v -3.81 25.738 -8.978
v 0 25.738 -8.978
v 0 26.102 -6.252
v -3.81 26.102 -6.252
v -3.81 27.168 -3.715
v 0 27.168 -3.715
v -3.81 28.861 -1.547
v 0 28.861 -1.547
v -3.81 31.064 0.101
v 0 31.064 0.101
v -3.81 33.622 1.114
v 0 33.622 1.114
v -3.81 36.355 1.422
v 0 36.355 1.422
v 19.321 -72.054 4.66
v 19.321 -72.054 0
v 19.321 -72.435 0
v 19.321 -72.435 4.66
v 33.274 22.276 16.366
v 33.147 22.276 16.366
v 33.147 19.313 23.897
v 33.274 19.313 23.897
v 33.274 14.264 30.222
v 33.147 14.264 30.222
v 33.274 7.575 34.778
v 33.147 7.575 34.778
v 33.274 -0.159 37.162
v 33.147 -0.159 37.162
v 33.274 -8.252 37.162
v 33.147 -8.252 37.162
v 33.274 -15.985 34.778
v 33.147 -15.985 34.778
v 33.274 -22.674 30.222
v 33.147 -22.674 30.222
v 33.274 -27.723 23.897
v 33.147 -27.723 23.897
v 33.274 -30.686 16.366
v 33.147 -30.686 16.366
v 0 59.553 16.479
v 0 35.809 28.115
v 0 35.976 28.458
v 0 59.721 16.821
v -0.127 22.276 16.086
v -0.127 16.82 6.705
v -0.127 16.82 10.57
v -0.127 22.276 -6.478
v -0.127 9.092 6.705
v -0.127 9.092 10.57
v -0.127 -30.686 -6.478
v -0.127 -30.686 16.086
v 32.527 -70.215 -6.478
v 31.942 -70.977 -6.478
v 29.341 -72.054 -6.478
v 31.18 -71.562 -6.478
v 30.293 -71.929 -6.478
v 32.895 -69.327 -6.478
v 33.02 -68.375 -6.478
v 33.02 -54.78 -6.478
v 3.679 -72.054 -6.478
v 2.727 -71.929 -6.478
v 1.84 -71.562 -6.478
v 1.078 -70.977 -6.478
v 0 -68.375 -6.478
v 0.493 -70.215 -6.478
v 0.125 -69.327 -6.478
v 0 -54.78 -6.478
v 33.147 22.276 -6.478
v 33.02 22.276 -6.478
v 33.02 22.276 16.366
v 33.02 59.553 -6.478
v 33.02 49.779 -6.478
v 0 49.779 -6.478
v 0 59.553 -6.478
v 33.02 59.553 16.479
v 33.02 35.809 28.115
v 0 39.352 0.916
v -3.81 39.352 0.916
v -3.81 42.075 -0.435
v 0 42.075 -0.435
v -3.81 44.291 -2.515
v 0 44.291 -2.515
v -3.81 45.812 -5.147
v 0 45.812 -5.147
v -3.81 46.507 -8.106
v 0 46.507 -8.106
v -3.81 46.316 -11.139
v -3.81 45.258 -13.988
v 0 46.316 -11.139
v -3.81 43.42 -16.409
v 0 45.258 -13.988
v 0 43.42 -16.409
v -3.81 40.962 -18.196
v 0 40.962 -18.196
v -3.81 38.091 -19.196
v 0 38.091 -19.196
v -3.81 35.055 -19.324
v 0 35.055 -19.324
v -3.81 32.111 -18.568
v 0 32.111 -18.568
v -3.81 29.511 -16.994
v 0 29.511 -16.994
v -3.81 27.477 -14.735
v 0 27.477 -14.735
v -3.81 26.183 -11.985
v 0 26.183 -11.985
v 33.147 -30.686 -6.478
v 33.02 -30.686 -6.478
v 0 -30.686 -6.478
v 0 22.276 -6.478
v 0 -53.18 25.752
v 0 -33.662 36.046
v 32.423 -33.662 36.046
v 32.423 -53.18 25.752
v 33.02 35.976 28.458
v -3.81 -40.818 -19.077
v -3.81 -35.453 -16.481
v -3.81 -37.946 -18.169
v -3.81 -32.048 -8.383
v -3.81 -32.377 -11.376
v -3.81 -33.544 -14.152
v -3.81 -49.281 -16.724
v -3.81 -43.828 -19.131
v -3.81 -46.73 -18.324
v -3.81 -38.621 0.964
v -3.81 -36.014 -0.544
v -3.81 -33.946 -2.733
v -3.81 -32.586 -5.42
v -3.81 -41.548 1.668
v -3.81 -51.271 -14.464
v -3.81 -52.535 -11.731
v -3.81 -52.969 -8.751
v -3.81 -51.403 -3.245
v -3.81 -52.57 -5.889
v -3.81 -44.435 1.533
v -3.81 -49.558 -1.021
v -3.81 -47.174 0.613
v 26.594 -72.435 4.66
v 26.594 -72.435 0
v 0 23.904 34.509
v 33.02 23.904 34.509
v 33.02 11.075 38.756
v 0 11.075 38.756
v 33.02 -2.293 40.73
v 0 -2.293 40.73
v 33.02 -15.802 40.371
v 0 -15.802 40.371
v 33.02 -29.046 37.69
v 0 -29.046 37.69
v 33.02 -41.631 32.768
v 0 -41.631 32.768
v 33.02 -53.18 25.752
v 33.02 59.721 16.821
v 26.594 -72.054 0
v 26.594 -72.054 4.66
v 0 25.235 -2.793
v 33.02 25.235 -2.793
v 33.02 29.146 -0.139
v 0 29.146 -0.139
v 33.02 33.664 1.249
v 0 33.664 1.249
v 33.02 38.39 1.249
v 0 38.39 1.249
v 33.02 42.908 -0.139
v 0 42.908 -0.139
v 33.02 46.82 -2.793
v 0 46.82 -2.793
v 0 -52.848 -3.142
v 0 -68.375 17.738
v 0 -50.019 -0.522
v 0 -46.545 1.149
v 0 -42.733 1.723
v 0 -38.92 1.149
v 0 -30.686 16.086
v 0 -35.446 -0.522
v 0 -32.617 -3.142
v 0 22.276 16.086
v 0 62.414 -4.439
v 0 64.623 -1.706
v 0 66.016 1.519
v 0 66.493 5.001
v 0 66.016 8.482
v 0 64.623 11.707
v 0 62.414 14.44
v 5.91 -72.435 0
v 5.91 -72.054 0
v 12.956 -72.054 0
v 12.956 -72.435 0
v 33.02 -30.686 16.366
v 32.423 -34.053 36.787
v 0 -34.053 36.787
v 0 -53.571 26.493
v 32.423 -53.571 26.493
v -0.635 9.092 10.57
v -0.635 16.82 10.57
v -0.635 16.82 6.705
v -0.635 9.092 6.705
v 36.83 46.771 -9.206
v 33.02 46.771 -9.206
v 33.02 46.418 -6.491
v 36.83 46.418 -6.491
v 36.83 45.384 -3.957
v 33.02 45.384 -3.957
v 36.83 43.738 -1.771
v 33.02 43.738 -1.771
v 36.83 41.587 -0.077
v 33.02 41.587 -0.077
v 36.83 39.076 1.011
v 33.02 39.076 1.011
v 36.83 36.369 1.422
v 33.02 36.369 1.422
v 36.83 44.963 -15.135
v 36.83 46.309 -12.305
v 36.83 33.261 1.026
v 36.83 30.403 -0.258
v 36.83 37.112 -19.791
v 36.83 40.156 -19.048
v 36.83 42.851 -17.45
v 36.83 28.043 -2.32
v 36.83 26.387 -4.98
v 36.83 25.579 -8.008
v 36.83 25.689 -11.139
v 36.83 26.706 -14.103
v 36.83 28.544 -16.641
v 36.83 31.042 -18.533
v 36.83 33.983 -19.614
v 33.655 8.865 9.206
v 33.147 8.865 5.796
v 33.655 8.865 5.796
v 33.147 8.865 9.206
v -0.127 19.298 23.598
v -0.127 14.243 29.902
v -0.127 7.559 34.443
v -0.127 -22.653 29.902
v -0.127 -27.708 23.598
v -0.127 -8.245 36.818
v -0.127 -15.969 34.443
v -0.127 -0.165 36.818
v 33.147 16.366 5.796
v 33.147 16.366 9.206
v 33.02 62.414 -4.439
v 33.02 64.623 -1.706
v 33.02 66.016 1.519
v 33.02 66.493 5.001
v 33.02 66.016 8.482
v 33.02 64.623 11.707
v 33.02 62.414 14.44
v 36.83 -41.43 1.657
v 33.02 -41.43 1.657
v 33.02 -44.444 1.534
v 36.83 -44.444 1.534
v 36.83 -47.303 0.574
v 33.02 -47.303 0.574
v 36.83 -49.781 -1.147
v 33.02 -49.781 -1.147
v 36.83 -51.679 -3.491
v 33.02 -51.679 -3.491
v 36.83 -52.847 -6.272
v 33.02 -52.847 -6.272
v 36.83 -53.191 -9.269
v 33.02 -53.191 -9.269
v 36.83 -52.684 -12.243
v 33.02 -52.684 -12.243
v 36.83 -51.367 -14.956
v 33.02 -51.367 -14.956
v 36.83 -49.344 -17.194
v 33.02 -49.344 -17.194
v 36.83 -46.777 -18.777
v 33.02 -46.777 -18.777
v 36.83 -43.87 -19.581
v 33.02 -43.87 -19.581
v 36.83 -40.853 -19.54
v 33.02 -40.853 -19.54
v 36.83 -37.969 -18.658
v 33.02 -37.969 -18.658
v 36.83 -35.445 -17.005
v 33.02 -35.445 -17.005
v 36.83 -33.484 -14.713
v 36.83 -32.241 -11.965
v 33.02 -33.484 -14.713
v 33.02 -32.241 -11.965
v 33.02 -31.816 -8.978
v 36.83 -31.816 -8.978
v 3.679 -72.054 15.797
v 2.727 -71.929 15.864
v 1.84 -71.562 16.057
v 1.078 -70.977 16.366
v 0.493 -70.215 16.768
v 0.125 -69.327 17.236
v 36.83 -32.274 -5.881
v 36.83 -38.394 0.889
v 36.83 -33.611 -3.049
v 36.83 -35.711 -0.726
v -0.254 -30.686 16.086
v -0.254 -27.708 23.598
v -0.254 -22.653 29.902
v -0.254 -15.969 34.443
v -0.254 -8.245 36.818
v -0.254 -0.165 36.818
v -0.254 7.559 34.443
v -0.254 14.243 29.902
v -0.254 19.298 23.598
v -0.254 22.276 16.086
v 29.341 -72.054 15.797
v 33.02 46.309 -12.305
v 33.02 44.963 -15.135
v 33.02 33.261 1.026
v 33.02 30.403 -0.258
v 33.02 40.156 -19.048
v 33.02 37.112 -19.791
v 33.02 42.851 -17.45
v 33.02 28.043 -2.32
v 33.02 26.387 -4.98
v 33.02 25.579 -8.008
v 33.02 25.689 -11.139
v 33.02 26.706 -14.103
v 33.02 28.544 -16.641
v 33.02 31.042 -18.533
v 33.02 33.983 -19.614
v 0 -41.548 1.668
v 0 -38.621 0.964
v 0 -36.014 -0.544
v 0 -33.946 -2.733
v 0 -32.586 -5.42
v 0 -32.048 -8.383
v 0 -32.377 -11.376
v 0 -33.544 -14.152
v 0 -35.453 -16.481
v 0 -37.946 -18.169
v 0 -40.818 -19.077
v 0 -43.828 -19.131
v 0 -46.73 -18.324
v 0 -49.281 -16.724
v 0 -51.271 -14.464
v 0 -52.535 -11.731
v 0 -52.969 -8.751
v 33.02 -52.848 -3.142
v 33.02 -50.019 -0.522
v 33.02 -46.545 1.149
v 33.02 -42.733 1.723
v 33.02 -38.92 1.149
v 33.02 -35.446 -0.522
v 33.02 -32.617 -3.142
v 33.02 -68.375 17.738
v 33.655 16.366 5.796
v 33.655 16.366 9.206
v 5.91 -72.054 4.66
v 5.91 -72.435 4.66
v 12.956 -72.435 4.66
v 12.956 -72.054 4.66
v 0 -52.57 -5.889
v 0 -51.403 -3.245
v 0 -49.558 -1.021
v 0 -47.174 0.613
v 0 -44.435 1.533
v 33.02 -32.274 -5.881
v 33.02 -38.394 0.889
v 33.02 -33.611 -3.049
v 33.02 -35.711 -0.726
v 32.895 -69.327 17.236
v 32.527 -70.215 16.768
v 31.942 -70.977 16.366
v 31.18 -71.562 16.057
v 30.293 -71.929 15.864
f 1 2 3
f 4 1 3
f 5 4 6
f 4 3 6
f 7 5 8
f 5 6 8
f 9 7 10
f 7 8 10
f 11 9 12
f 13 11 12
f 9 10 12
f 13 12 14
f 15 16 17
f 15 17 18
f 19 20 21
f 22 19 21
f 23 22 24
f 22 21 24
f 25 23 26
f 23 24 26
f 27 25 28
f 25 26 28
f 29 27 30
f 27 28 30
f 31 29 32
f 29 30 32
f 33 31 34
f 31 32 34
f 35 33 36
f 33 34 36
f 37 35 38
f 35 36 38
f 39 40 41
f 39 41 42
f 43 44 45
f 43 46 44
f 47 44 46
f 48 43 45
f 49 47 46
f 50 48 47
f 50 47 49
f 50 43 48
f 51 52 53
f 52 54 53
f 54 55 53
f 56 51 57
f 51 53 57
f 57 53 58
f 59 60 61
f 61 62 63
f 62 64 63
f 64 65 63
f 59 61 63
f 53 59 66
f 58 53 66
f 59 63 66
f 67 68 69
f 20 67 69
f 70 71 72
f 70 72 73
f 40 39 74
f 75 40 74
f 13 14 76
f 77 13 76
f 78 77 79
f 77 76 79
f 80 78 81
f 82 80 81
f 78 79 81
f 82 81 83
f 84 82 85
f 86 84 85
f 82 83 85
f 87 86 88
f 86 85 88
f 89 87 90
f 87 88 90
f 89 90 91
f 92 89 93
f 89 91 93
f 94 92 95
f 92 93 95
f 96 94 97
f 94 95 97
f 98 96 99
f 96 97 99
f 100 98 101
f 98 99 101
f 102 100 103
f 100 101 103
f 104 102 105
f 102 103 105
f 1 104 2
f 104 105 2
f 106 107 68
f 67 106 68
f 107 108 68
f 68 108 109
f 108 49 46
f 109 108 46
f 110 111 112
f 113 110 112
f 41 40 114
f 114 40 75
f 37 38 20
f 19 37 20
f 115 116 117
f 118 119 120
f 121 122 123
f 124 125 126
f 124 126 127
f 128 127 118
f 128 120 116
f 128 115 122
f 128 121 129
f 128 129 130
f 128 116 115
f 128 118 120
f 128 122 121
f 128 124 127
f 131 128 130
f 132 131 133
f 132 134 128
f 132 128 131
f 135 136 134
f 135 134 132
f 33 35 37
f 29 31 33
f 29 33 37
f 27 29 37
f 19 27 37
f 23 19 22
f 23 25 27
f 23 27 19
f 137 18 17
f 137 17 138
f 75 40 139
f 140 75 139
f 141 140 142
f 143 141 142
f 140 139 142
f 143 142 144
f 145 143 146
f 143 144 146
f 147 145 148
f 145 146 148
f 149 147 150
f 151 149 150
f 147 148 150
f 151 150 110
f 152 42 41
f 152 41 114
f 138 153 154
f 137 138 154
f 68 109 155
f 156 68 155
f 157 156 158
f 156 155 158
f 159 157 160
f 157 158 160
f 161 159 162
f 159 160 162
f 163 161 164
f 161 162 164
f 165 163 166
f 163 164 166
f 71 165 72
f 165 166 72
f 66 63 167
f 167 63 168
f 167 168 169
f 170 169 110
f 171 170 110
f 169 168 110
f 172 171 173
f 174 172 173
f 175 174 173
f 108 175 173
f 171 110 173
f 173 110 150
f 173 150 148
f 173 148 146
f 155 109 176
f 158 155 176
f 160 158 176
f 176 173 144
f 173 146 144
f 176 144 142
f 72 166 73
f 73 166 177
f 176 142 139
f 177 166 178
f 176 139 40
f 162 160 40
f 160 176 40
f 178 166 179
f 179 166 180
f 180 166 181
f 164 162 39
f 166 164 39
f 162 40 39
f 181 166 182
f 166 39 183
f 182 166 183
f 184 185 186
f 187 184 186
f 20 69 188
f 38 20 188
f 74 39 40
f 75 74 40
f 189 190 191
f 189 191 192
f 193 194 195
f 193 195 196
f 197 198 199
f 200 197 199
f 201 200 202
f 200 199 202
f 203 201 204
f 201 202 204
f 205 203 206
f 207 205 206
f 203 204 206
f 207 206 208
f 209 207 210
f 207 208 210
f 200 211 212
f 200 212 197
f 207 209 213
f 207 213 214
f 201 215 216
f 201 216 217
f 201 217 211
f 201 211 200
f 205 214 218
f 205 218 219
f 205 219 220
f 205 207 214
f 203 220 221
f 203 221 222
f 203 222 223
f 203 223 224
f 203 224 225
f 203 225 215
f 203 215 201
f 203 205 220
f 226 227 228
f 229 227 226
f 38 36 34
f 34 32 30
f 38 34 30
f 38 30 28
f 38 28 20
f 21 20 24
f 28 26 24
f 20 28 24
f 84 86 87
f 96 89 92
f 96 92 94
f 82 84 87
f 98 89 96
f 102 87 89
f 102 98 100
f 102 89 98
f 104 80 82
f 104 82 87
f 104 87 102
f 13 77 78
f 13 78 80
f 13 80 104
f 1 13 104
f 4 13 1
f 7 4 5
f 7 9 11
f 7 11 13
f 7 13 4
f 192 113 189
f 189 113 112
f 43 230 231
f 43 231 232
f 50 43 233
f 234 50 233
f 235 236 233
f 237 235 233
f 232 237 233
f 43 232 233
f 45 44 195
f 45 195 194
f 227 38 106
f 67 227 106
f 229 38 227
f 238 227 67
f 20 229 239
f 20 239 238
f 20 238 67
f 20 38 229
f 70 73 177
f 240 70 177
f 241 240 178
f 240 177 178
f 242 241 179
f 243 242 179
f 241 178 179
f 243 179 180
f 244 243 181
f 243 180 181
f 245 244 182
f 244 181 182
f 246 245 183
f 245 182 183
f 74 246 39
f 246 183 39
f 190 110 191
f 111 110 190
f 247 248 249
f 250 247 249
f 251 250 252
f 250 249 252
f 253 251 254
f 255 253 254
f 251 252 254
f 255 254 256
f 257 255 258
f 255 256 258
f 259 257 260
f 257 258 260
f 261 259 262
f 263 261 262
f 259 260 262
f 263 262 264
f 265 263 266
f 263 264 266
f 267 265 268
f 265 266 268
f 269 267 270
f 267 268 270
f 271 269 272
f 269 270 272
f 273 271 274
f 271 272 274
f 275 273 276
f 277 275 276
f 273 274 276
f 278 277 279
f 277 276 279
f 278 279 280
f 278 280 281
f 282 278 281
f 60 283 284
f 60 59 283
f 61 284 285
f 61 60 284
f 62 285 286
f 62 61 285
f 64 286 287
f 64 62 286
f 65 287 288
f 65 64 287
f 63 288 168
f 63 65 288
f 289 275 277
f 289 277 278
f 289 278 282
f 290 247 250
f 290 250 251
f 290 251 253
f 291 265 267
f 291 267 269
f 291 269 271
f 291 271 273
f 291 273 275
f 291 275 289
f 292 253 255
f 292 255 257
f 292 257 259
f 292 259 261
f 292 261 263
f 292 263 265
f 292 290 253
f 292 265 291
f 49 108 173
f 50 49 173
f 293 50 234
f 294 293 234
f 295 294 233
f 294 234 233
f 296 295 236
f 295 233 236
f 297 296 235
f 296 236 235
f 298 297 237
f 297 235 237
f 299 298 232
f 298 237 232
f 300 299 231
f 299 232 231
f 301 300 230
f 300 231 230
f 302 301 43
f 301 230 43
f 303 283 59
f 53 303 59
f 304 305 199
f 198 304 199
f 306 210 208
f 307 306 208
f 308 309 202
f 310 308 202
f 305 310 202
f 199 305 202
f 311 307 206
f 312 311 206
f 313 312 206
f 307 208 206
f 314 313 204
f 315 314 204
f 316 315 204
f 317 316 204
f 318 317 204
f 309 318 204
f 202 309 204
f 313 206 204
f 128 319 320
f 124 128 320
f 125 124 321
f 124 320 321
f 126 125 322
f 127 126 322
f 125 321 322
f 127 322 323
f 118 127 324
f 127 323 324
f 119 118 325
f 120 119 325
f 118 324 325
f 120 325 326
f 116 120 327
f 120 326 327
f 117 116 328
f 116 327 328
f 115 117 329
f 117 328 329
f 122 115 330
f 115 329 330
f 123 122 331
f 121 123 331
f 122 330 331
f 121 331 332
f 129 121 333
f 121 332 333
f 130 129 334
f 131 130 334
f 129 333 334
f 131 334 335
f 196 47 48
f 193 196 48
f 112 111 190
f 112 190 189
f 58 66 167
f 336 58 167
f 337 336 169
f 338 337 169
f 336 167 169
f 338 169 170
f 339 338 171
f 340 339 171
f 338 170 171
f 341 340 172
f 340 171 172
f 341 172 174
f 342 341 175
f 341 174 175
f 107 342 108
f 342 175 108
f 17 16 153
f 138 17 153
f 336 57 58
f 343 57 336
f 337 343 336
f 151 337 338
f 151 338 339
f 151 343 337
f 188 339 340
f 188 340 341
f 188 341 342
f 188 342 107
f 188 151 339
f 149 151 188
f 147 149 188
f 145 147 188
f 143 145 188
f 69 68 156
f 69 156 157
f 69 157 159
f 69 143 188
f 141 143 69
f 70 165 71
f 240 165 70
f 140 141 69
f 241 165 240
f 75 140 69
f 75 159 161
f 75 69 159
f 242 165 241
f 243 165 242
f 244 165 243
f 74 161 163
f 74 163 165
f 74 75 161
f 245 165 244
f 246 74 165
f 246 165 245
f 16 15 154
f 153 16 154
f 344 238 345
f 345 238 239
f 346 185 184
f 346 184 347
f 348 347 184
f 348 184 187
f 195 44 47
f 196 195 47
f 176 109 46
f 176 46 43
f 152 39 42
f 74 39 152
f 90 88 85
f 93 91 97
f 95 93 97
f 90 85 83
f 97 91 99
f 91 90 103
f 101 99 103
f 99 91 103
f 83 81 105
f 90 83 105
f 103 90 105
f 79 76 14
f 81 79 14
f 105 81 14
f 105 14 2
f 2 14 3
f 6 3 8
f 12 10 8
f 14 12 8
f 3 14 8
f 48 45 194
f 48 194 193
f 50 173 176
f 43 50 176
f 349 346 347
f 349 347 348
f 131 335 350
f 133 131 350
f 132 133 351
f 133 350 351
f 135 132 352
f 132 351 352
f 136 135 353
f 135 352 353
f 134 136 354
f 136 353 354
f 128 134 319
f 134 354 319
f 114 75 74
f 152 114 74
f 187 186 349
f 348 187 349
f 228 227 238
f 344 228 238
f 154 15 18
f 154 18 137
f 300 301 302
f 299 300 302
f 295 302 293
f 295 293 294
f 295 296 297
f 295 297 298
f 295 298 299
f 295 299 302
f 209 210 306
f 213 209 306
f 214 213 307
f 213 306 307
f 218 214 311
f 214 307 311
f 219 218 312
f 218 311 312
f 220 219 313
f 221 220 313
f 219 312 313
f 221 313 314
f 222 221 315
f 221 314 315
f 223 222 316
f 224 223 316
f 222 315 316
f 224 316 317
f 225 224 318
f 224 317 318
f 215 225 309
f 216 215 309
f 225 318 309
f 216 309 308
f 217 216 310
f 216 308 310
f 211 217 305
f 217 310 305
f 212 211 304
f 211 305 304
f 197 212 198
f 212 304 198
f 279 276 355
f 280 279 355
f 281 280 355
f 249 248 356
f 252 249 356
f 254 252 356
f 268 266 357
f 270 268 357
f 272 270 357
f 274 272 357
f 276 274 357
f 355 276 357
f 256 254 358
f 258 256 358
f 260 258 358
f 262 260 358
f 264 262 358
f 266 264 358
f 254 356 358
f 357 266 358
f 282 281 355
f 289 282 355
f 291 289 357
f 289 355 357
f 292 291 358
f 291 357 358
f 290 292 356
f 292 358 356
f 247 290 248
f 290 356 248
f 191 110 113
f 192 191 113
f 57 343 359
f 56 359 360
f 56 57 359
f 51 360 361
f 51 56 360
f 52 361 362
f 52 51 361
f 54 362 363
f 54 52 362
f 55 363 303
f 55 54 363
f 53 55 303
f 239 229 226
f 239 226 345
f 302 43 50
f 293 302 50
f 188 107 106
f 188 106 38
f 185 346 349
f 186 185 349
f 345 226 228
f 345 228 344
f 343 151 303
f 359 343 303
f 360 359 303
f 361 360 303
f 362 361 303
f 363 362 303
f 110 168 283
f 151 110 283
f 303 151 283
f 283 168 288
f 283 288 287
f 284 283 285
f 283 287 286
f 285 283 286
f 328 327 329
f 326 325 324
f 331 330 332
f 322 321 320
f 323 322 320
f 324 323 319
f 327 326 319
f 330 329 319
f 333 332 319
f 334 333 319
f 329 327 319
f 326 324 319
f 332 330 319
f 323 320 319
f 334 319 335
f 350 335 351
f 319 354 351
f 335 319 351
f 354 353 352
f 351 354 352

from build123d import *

# Parameters (mm, degrees)
F1_DEPTH  = 33.02
F4_DEPTH  = 3.81
F6_DEPTH  = 3.81
F7_DEPTH  = 3.81
F8_DEPTH  = 3.81
F9_W      = 27.328588767
F9_H      = 22.564008832
F9_W_2    = 25.6325763185
F10_DEPTH = 0.127
F12_DEPTH = 0.127
F13_W     = 25.650058873
F13_H     = 22.8437650949
F13_W_2   = 27.3111062124
F14_DEPTH = 0.127
F16_DEPTH = 0.127
F17_R     = 3.6792614691
F18_W     = 7.7282376587
F18_H     = 3.8641188294
F19_DEPTH = 0.508
F20_W     = 7.5009372085
F20_H     = 3.4095174633
F21_DEPTH = 0.508
F22_W     = 33.02
F22_H     = 26.4421320528
F23_DEPTH = 0.381
F24_W     = 7.0463349111
F24_H     = 4.6596731991
F25_DEPTH = 0.381
F24_W_2   = 7.2736367583
F26_W     = 32.4227958918
F26_H     = 22.0667268427
F27_DEPTH = 0.8382


with BuildPart() as f1:
    # F0 (on Right) → F1 (new body)
    with BuildSketch(Plane.YZ):
        with BuildLine():
            Line((-72.0544606447, 15.7974287868), (-72.0544606447, -6.4780823886))
            Line((-72.0544606447, -6.4780823886), (-54.779574275, -6.4780823886))
            ThreePointArc((-54.779574275, -6.4780823886), (-42.7326140925, 1.7227260465), (-30.68565391, -6.4780823886))
            Line((-30.68565391, -6.4780823886), (22.2755111754, -6.4780823886))
            ThreePointArc((22.2755111754, -6.4780823886), (36.0272303224, 1.4251967706), (49.7789494693, -6.4780823886))
            Line((49.7789494693, -6.4780823886), (59.5528967679, -6.4780823886))
            ThreePointArc((59.5528967679, -6.4780823886), (66.4925608321, 5.0006248057), (59.5528967679, 16.479332))
            Line((59.5528967679, 16.479332), (35.8086712658, 28.1154010445))
            ThreePointArc((35.8086712658, 28.1154010445), (-9.055266807, 40.8429036735), (-53.1802996993, 25.7517229766))
            Line((-53.1802996993, 25.7517229766), (-72.0544606447, 15.7974287868))
        make_face()
    extrude(amount=F1_DEPTH)

    # F9 (on face) → F10 (join)
    with BuildSketch(Plane(origin=(0, 0, 0), x_dir=(0, -1, 0), z_dir=(-1, 0, 0))):
        with Locations((17.0213595266, 4.8039220273)):
            Rectangle(F9_W, F9_H)
        with Locations((-9.4592230162, 4.8039220273)):
            Rectangle(F9_W_2, F9_H)
    extrude(amount=F10_DEPTH)

    # F13 (on face) → F14 (join)
    with BuildSketch(Plane.YZ.offset(33.02)):
        with Locations((-17.8606244735, 4.9438001588)):
            Rectangle(F13_W, F13_H)
        with Locations((8.6199580692, 4.9438001588)):
            Rectangle(F13_W_2, F13_H)
    extrude(amount=F14_DEPTH)

    # F17
    f17_edges = [f1.edges().sort_by_distance(p)[0] for p in [
        (33.02, -72.054461, 4.659673),
        (0, -72.054461, 4.659673),
    ]]
    fillet(f17_edges, radius=F17_R)

    # F18 (on face) → F19 (join)
    with BuildSketch(Plane(origin=(-0.127, 0, 0), x_dir=(0, -1, 0), z_dir=(-1, 0, 0))):
        with Locations((-12.9561647773, 8.6374431849)):
            Rectangle(F18_W, F18_H)
    extrude(amount=F19_DEPTH)

    # F20 (on face) → F21 (join)
    with BuildSketch(Plane.YZ.offset(33.147)):
        with Locations((12.6152122393, 7.5009374414)):
            Rectangle(F20_W, F20_H)
    extrude(amount=F21_DEPTH)


with BuildPart() as f4:
    # F3 (on face) → F4 (new body)
    with BuildSketch(Plane(origin=(0, 0, 0), x_dir=(0, -1, 0), z_dir=(-1, 0, 0))):
        with BuildLine():
            ThreePointArc((52.9687167629, -8.75109341), (49.5576315125, -1.0214346933), (41.5484134697, 1.6684635958))
            ThreePointArc((41.5484134697, 1.6684635958), (35.4529939095, -16.4807521266), (52.9687167629, -8.75109341))
        make_face()
    extrude(amount=F4_DEPTH)


with BuildPart() as f6:
    # F5 (on face) → F6 (new body)
    with BuildSketch(Plane(origin=(0, 0, 0), x_dir=(0, -1, 0), z_dir=(-1, 0, 0))):
        with BuildLine():
            ThreePointArc((-36.355320034, 1.4218147435), (-43.4202929367, -16.4094452618), (-25.7384614591, -8.9783947915))
            ThreePointArc((-25.7384614591, -8.9783947915), (-28.8614700209, -1.5473443211), (-36.355320034, 1.4218147435))
        make_face()
    extrude(amount=F6_DEPTH)


with BuildPart() as f7:
    # F2 (on face) → F7 (new body)
    with BuildSketch(Plane.YZ.offset(33.02)):
        with BuildLine():
            ThreePointArc((46.7705525025, -9.205696173), (43.7375665733, -1.7706251144), (36.3694250314, 1.421517663))
            ThreePointArc((36.3694250314, 1.421517663), (28.5441963843, -16.6407672316), (46.7705525025, -9.205696173))
        make_face()
    extrude(amount=F7_DEPTH)


with BuildPart() as f8:
    # F2 (on face) → F8 (new body)
    with BuildSketch(Plane.YZ.offset(33.02)):
        with BuildLine():
            ThreePointArc((-41.4298194057, 1.6570218497), (-50.4351748735, -16.1468018018), (-31.8156554208, -8.9783947915))
            ThreePointArc((-31.8156554208, -8.9783947915), (-34.5754505485, -1.8099877812), (-41.4298194057, 1.6570218497))
        make_face()
    extrude(amount=F8_DEPTH)


with BuildPart() as f12:
    # F11 (on face) → F12 (new body)
    with BuildSketch(Plane(origin=(-0.127, 0, 0), x_dir=(0, -1, 0), z_dir=(-1, 0, 0))):
        with BuildLine():
            Line((-22.2755111754, 16.0859264433), (30.68565391, 16.0859264433))
            ThreePointArc((30.68565391, 16.0859264433), (4.2050713673, 37.1199804122), (-22.2755111754, 16.0859264433))
        make_face()
    extrude(amount=F12_DEPTH)


with BuildPart() as f16:
    # F15 (on face) → F16 (new body)
    with BuildSketch(Plane.YZ.offset(33.147)):
        with BuildLine():
            Line((-30.68565391, 16.3656827062), (22.2755111754, 16.3656827062))
            ThreePointArc((22.2755111754, 16.3656827062), (-4.2050713673, 37.4650683461), (-30.68565391, 16.3656827062))
        make_face()
    extrude(amount=F16_DEPTH)


with BuildPart() as f23:
    # F22 (on face) → F23 (new body)
    with BuildSketch(Plane(origin=(0, 18.0444238009, 36.8209286267), x_dir=(1, 0, 0), z_dir=(0, 0.4400578978, 0.8979694018))):
        with Locations((16.51, 33.0037528632)):
            Rectangle(F22_W, F22_H)
    extrude(amount=F23_DEPTH)


with BuildPart() as f25:
    # F24 (on face) → F25 (new body)
    with BuildSketch(Plane.XZ.offset(72.0544606447)):
        with Locations((9.4329973217, 2.3298365995)):
            Rectangle(F24_W, F24_H)
    extrude(amount=F25_DEPTH)


with BuildPart() as f25b:
    # F24 (on face) → F25, piece 2 (new body)
    with BuildSketch(Plane.XZ.offset(72.0544606447)):
        with Locations((22.9574162513, 2.3298365995)):
            Rectangle(F24_W_2, F24_H)
    extrude(amount=F25_DEPTH)


with BuildPart() as f27:
    # F26 (on face) → F27 (new body)
    with BuildSketch(Plane(origin=(0, -22.1990952851, 42.0913114746), x_dir=(1, 0, 0), z_dir=(0, -0.4664995085, 0.8845214574))):
        with Locations((16.2113979459, -23.992586662)):
            Rectangle(F26_W, F26_H)
    extrude(amount=F27_DEPTH)


solid = Compound([f1.part, f4.part, f6.part, f7.part, f8.part, f12.part, f16.part, f23.part, f25.part, f25b.part, f27.part])
